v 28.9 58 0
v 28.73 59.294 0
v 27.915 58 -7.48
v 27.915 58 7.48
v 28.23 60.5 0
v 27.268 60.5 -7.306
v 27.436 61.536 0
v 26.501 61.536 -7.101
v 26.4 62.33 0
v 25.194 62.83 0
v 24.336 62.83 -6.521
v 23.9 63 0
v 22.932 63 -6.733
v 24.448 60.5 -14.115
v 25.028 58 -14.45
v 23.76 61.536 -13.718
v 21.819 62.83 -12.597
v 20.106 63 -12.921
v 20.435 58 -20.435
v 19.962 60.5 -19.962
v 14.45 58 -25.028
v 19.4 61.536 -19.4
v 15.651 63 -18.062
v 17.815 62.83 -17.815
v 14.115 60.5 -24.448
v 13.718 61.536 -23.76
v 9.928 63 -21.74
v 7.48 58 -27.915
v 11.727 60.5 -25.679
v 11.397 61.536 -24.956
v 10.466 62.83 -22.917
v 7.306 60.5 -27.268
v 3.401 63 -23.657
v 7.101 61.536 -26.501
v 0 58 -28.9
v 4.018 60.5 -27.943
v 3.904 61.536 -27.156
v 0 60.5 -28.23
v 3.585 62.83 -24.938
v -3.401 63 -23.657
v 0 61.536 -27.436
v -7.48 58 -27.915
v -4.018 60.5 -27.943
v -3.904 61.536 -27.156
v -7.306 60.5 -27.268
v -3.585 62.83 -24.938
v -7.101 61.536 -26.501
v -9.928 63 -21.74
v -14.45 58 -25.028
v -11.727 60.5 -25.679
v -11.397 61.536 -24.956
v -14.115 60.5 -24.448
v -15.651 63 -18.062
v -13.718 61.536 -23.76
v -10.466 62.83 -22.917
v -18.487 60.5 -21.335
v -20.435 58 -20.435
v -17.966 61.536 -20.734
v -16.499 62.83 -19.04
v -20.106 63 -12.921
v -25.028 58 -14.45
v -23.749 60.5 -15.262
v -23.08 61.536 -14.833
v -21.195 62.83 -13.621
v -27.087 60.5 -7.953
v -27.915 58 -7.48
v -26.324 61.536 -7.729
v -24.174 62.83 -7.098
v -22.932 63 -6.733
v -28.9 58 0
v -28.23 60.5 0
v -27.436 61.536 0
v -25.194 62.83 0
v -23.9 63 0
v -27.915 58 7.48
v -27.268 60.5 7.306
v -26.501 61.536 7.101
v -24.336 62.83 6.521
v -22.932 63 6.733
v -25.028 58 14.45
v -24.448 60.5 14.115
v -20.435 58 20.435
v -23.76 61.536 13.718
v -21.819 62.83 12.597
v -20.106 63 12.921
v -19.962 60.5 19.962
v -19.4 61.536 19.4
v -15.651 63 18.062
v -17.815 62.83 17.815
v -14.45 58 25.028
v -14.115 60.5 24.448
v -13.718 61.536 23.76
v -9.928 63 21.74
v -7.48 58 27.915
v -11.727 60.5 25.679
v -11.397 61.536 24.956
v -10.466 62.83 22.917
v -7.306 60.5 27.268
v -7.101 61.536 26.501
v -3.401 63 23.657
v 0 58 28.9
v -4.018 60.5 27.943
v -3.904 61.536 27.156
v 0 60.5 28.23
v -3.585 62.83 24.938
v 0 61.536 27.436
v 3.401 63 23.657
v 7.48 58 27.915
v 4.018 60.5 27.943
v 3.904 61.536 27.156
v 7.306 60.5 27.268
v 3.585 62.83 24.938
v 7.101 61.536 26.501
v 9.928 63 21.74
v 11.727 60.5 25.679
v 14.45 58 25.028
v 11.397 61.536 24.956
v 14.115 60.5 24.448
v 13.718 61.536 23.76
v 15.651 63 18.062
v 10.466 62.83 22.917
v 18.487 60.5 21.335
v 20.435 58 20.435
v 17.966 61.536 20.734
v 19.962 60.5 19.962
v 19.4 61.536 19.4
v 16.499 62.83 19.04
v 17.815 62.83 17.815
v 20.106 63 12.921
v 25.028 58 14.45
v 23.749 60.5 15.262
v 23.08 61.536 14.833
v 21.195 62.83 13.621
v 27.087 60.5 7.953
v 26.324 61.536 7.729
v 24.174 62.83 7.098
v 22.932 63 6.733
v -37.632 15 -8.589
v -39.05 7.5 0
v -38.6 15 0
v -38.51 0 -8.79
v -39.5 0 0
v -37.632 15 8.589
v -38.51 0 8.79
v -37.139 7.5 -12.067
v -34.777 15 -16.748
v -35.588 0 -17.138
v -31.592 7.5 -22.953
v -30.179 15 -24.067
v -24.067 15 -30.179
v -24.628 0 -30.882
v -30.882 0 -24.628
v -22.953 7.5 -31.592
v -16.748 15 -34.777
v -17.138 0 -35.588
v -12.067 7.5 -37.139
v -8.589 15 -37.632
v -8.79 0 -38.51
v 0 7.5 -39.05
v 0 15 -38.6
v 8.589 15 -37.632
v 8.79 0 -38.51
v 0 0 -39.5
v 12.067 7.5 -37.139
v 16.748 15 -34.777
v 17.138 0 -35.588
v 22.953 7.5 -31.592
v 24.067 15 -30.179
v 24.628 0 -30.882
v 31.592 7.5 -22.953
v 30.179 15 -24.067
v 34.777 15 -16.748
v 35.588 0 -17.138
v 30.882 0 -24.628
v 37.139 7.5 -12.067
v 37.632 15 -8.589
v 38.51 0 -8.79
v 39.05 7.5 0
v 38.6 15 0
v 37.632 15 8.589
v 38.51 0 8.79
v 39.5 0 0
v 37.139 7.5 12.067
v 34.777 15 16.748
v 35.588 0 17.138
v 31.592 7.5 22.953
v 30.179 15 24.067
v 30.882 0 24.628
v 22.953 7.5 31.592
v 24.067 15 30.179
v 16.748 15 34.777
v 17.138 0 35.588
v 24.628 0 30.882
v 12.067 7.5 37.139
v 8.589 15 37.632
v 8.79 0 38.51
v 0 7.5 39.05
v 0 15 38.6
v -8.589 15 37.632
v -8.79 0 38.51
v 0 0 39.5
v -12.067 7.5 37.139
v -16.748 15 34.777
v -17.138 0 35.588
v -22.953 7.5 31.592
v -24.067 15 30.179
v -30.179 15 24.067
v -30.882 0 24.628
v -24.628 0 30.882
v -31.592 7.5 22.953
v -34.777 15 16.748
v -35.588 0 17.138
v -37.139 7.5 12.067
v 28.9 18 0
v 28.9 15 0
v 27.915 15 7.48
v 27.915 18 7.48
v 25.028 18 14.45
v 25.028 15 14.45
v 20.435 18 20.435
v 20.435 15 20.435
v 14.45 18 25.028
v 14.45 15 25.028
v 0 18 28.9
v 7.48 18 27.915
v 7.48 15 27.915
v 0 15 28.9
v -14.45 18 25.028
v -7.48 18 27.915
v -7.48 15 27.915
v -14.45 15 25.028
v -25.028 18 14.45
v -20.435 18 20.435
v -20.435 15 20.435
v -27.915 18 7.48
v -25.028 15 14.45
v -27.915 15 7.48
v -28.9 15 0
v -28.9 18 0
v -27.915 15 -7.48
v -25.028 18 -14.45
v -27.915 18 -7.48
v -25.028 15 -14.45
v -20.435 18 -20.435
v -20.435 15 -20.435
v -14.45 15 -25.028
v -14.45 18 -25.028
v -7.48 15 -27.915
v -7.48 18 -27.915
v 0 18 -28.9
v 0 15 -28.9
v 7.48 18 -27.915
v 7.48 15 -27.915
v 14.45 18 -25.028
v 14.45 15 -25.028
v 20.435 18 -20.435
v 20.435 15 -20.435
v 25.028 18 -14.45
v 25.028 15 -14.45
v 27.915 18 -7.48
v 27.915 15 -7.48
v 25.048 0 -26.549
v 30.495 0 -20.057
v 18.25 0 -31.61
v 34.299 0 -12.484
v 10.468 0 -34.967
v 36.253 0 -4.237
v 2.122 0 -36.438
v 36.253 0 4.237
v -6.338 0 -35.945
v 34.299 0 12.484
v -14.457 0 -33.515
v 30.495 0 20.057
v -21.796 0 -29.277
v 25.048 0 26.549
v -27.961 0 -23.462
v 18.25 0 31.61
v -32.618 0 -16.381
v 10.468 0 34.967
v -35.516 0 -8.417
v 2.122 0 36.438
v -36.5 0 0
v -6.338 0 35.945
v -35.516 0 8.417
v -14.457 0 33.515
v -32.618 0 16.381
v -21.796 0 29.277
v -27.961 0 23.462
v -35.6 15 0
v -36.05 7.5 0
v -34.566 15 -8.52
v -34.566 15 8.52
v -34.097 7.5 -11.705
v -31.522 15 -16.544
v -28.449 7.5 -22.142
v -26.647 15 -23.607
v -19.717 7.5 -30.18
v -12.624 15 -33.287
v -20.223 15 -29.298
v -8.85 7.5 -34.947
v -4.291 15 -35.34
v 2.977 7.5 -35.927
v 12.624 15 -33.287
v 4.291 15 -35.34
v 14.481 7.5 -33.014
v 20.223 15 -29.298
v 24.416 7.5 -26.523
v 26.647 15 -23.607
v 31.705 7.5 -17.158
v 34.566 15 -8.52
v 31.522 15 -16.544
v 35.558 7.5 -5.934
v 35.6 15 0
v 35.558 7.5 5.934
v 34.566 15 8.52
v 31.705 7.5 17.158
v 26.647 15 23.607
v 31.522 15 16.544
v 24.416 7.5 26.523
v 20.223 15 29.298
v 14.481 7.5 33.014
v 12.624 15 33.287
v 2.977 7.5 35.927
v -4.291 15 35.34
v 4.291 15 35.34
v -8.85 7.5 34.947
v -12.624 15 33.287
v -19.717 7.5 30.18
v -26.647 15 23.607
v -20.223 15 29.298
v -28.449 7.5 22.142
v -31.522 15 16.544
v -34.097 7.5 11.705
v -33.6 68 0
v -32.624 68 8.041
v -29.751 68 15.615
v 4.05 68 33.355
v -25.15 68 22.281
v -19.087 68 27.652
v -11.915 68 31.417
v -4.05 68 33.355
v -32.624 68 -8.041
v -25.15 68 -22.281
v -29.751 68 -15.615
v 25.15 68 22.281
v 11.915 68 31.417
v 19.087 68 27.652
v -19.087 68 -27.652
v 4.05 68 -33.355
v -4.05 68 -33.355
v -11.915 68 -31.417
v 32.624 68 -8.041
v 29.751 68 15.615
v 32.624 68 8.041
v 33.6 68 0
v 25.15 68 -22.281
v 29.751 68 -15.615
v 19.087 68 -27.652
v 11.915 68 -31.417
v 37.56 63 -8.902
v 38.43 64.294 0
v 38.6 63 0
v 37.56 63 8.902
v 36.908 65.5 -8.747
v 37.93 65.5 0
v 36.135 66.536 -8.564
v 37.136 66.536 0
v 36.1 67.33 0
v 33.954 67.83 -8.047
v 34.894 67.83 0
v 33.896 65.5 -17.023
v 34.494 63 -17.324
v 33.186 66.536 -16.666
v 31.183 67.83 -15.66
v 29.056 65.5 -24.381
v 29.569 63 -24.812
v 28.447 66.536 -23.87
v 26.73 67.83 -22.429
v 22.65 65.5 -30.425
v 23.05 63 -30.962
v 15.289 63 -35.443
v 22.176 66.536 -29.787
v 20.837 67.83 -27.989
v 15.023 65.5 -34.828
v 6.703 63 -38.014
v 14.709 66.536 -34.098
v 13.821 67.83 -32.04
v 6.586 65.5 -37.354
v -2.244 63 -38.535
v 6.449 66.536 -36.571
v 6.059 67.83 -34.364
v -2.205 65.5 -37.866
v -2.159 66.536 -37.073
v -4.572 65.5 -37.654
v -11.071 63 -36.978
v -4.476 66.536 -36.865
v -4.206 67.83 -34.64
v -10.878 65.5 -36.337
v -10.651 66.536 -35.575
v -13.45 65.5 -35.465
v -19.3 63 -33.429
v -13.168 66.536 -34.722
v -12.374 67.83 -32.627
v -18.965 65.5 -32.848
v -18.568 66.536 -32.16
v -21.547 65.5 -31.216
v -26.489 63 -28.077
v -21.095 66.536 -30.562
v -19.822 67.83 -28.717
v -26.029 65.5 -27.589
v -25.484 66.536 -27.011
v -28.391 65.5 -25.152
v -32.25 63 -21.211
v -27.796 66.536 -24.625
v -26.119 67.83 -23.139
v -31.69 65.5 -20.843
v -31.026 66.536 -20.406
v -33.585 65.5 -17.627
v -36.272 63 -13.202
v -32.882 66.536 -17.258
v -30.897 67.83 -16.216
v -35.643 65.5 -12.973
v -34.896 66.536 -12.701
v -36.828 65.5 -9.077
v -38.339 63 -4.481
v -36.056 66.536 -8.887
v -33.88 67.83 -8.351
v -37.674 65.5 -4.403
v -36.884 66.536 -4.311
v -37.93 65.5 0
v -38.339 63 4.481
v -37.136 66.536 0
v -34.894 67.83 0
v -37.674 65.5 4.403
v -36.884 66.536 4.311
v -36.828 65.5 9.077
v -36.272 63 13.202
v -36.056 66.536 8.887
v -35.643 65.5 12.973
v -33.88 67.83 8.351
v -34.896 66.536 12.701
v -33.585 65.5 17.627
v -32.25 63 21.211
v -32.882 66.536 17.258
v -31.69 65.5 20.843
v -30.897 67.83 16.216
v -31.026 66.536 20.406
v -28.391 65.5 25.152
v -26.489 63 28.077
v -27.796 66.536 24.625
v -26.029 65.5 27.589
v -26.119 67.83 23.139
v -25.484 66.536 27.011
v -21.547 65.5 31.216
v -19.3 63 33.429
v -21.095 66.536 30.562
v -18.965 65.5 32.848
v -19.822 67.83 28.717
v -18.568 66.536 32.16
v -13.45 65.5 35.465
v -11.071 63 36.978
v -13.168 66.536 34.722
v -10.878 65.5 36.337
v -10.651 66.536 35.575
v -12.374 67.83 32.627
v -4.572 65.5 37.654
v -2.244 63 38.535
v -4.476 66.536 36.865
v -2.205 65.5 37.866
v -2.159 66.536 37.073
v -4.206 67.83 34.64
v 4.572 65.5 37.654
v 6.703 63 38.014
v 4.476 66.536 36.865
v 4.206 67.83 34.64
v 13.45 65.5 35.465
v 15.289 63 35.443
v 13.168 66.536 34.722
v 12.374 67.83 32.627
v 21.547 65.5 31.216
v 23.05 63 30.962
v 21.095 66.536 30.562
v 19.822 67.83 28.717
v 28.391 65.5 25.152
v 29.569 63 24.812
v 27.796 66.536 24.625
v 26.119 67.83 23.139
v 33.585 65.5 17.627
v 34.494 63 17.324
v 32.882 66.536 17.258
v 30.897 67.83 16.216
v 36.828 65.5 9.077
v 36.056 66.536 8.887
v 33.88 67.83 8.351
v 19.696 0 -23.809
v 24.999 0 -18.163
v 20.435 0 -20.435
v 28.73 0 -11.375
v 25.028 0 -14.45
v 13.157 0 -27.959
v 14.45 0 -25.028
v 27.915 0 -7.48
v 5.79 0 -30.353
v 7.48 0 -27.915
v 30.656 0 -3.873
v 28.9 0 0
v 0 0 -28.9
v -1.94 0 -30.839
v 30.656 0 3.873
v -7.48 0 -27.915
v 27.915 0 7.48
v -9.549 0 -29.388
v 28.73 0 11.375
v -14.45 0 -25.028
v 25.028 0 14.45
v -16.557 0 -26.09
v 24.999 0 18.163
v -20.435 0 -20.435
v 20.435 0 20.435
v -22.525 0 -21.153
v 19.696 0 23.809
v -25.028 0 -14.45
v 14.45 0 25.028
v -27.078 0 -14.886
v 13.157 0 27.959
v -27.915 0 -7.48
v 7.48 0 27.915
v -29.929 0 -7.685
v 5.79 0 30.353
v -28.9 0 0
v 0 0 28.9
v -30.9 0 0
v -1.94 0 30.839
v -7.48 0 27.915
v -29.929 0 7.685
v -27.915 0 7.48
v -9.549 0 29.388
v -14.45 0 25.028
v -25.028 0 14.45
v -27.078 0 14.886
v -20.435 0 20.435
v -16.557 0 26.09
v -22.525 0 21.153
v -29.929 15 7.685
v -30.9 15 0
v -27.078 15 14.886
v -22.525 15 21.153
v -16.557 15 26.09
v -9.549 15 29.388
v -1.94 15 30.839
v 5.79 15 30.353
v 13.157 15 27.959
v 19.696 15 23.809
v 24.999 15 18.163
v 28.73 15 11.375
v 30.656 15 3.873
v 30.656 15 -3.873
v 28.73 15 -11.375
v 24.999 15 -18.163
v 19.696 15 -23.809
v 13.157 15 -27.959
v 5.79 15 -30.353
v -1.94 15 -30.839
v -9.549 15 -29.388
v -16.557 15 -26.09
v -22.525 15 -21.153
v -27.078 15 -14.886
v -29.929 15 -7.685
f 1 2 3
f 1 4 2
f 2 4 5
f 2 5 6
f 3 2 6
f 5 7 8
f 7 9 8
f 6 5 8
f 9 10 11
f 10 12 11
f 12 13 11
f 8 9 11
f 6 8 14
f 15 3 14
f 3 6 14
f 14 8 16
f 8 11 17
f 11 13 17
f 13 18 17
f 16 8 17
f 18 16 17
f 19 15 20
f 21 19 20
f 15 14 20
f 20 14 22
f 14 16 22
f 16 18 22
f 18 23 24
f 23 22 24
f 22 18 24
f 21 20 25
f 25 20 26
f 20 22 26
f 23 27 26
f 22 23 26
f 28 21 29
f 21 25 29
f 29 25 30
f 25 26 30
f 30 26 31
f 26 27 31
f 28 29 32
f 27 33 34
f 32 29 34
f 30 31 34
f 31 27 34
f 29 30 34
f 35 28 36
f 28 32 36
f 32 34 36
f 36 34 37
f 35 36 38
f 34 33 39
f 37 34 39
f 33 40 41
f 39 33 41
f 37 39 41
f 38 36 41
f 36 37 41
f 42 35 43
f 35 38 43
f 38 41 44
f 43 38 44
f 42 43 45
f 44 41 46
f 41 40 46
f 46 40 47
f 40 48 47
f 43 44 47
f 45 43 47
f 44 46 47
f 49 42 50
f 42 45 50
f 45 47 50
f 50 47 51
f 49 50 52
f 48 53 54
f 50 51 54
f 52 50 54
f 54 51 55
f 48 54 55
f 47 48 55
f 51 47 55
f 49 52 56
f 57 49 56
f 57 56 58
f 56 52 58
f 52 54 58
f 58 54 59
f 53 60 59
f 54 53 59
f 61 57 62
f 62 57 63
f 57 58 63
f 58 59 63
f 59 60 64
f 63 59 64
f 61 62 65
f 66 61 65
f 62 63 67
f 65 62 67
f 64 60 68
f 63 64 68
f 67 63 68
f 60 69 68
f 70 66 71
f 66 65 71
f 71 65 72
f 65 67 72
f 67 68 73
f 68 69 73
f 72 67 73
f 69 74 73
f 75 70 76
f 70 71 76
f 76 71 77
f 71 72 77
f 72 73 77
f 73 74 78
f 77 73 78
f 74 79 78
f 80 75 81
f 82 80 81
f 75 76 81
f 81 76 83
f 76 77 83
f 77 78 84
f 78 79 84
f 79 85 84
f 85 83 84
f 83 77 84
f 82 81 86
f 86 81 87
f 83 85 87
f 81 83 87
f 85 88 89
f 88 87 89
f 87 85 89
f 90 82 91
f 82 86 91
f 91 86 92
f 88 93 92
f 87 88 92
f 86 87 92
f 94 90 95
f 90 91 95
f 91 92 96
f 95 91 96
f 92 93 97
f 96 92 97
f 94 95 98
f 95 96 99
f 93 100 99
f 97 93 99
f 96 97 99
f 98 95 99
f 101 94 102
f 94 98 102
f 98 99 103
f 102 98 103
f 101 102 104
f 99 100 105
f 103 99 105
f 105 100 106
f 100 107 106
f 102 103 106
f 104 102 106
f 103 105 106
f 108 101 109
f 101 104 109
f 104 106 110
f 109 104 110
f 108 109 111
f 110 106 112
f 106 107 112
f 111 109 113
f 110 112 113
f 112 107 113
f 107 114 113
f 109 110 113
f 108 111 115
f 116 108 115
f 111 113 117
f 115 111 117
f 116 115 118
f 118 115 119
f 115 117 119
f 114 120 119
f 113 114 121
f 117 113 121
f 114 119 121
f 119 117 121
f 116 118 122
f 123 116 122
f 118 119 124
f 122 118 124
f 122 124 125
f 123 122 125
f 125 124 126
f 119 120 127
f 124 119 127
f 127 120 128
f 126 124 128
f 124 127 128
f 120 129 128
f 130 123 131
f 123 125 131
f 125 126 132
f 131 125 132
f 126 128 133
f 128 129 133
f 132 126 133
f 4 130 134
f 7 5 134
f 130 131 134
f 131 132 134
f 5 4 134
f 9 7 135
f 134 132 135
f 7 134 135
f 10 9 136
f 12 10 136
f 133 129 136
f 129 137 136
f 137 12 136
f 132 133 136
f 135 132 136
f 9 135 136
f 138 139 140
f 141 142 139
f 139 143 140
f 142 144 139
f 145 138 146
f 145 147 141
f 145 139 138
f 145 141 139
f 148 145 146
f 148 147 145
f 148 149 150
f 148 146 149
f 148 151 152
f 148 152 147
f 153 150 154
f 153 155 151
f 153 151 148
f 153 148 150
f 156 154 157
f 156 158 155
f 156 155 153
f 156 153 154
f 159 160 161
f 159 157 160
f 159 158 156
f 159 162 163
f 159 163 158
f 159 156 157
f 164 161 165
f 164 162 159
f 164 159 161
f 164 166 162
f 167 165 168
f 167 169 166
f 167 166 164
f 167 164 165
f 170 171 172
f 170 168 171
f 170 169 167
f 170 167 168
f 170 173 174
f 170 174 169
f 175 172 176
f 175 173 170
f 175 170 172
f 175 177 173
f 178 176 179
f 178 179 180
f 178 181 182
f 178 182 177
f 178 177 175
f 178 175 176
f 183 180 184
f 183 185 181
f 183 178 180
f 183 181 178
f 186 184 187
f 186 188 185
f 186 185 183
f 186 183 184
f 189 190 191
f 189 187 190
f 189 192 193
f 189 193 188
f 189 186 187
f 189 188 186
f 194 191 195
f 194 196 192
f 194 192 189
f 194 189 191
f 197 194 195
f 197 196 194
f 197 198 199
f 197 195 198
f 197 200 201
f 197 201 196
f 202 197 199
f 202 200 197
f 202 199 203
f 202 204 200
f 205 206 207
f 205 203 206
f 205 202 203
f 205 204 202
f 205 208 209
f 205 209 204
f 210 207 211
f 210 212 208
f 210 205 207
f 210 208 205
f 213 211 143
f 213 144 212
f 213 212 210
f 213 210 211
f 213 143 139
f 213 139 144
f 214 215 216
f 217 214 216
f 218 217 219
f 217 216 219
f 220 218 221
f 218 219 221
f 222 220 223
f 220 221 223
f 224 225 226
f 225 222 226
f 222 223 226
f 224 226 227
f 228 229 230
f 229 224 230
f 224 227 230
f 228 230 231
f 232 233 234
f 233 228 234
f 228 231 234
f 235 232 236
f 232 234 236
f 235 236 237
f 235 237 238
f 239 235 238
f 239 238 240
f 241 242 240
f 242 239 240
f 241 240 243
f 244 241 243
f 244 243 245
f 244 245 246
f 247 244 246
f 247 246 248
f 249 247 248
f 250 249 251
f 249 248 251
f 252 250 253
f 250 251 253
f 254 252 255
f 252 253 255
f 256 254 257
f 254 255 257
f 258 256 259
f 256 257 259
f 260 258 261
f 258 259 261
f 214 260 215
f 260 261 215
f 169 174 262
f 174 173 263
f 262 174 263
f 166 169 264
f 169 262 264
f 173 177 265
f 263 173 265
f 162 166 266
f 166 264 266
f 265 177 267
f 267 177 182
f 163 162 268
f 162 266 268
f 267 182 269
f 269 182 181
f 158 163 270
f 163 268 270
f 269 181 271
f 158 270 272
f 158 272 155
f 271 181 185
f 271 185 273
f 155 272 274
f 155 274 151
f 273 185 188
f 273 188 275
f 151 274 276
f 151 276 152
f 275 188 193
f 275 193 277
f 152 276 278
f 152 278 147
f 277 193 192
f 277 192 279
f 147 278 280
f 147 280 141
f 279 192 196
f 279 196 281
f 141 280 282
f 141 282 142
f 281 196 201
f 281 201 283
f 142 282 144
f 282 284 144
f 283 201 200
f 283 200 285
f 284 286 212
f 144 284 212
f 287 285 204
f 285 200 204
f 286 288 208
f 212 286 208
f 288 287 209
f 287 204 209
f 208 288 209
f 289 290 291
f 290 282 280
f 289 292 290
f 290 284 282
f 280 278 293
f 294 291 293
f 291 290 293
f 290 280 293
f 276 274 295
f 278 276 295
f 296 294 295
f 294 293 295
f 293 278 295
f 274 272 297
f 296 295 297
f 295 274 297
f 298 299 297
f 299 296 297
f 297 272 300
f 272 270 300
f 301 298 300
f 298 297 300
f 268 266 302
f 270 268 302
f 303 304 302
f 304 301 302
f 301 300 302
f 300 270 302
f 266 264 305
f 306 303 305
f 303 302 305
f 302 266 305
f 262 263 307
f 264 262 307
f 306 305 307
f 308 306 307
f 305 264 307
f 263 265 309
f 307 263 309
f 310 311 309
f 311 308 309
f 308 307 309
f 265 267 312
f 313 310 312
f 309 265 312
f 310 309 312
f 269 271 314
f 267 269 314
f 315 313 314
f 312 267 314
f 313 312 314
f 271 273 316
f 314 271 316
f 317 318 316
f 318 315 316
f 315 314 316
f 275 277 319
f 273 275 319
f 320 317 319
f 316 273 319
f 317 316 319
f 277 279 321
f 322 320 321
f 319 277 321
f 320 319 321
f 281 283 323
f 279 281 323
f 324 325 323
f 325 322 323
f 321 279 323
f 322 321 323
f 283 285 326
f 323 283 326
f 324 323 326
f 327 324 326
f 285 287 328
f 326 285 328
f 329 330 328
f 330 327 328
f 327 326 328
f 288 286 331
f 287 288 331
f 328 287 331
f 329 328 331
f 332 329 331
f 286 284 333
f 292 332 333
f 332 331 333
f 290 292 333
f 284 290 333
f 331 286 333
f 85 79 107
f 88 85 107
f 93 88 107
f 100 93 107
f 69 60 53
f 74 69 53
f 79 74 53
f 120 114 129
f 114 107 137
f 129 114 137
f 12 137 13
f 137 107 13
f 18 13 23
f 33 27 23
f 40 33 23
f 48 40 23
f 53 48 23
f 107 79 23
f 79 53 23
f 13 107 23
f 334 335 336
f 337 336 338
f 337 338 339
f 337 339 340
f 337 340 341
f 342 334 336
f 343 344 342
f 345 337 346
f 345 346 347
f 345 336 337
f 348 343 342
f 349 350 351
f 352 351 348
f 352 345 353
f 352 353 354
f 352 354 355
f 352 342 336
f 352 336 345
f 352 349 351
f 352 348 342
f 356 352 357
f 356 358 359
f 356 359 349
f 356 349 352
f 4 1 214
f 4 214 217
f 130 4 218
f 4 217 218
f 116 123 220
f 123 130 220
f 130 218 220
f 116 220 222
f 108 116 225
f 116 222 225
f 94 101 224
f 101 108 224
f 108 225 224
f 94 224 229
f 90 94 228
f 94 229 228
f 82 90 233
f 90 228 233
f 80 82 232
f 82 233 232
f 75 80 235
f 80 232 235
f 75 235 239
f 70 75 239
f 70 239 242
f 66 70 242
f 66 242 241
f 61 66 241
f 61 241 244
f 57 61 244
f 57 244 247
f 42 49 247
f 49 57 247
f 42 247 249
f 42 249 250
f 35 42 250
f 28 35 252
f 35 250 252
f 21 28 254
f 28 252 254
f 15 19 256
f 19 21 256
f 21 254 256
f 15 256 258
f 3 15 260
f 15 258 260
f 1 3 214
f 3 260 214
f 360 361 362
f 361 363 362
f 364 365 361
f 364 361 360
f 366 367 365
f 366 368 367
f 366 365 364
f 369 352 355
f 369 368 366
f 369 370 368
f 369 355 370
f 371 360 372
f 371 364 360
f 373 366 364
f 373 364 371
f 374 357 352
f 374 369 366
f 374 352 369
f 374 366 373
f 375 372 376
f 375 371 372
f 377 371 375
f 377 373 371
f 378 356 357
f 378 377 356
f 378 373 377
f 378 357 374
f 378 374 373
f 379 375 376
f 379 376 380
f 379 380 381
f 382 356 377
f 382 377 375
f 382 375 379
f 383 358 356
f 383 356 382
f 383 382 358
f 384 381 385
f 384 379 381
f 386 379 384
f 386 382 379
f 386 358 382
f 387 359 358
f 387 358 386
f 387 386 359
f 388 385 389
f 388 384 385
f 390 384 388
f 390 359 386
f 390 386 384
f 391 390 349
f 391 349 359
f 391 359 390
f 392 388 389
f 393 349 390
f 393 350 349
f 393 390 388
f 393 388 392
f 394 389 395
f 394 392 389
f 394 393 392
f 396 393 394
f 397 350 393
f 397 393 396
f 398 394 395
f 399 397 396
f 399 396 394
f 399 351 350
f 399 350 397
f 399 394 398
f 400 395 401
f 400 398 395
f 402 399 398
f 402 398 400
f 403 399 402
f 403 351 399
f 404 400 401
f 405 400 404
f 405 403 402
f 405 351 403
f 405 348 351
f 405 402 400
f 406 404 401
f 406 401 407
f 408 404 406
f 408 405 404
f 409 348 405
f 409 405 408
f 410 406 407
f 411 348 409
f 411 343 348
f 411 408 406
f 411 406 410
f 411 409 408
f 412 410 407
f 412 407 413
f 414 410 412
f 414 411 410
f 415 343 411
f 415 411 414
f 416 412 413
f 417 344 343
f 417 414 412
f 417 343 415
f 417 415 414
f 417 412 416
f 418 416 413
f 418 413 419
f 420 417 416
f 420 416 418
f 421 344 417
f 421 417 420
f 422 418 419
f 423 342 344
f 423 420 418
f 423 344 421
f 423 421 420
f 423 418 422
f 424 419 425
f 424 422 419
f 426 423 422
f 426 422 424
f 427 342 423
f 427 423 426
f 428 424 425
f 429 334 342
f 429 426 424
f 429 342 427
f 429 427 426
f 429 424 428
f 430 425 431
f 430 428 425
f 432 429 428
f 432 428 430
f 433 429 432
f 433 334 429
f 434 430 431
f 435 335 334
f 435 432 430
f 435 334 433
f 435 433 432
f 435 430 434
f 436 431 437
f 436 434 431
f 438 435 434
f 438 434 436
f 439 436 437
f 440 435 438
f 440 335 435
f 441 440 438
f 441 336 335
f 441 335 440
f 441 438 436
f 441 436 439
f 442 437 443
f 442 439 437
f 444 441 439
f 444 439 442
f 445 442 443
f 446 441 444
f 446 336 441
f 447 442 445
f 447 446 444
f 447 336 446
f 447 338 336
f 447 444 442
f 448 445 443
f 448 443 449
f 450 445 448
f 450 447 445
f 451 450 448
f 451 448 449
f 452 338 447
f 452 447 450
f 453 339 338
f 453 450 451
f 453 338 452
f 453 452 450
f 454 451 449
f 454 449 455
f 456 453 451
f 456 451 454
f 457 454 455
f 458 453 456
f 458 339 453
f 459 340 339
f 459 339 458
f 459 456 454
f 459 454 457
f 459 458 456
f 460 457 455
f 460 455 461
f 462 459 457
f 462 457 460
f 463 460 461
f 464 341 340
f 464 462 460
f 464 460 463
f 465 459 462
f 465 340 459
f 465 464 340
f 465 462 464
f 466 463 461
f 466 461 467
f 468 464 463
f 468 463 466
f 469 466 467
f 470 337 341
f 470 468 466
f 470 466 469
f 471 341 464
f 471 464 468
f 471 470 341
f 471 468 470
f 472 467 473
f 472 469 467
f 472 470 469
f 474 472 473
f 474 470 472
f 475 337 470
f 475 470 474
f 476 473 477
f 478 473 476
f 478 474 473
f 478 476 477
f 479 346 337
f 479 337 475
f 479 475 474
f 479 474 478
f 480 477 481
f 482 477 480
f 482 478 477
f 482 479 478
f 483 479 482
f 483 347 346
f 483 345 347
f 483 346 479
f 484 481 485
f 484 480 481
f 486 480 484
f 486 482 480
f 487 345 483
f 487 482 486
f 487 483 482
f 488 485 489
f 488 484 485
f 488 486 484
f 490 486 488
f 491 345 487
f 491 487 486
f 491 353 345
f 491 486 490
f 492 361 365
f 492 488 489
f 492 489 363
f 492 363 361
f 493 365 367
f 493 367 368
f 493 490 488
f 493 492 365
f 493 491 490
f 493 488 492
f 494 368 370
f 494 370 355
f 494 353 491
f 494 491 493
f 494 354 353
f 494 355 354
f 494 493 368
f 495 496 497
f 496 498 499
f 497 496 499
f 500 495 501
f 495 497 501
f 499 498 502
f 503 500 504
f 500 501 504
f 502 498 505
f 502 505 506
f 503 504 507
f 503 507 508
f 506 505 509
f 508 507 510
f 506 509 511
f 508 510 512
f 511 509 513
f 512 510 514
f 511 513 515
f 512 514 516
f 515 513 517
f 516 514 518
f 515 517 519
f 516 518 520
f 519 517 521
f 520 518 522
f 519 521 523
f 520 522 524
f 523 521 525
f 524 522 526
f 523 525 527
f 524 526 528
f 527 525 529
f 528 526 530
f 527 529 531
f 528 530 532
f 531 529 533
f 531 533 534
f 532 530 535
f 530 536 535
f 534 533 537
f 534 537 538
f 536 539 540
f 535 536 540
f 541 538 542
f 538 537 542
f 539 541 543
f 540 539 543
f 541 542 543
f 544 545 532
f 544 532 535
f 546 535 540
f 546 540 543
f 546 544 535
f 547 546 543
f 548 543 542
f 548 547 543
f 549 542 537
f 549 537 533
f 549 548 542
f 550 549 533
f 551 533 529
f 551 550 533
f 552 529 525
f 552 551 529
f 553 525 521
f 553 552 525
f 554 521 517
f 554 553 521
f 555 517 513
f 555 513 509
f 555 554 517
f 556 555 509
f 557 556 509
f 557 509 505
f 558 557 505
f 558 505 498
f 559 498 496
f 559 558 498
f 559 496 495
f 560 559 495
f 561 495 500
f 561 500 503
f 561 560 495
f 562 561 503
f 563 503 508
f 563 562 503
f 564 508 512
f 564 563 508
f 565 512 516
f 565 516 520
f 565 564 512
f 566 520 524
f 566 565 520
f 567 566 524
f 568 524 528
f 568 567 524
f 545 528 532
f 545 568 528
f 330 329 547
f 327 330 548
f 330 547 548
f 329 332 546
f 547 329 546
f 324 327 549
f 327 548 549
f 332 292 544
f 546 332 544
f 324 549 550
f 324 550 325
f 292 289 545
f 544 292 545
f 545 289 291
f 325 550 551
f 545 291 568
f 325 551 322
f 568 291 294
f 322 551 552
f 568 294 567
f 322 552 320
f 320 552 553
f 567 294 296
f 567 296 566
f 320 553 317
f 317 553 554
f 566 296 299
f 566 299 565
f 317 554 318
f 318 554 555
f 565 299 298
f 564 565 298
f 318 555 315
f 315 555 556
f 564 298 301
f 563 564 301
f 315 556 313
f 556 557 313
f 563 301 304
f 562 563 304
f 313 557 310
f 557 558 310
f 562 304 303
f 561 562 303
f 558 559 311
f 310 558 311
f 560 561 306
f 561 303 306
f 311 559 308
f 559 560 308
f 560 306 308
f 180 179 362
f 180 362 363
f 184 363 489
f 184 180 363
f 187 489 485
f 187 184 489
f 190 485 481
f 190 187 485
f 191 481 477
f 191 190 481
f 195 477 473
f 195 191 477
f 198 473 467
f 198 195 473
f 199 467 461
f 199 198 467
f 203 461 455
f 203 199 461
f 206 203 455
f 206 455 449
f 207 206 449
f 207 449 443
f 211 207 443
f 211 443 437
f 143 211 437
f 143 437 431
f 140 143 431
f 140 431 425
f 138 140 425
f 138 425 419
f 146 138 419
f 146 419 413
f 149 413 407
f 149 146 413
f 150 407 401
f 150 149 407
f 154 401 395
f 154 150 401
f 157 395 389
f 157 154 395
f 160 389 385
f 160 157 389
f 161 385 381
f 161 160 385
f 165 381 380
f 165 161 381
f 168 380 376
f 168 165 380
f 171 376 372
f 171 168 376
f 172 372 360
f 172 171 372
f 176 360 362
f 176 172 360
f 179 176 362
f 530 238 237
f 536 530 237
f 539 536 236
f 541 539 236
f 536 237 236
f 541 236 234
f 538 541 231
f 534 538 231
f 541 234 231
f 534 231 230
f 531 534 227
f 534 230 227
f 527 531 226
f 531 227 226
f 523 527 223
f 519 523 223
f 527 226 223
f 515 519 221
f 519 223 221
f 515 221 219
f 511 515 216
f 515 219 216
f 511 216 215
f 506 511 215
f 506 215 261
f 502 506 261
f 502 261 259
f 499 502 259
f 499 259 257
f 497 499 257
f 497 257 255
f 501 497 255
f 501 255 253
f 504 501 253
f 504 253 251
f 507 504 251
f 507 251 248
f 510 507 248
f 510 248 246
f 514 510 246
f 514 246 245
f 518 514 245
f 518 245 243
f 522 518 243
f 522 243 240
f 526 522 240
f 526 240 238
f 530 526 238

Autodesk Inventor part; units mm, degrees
ref_plane "YZ Plane" through (0, 0, 0) normal (1, 0, 0) x (0, 1, 0)
sketch "Sketch1" plane through (0, 0, 0) normal (0, 1, 0) x (-1, 0, 0)
  circle A0 centre (0, 0) radius 35.1 construction
  circle A1 centre (0, 0) radius 31.4 construction
  circle A2 centre (0, 0) radius 36 construction
  circle A3 centre (0, 0) radius 27.65 construction
  circle A4 centre (0, 0) radius 32.3 construction
  circle A5 centre (0, 0) radius 31.8
  circle A6 centre (0, 0) radius 36.5
  circle A7 centre (0, 0) radius 29.8
  circle A8 centre (0, 0) radius 39.5
  dimension "d0" = 70.2
  dimension "d1" = 62.8
  dimension "d2" = 72
  dimension "d3" = 55.3
  dimension "d4" = 0.9
  dimension "d5" = 0.9
  dimension "d6" = 0.5
  dimension "d7" = 0.5
  dimension "d11" = 2
  dimension "d12" = 3
ref_plane "Work Plane1" through (0, 15, 0) normal (0, 1, 0) x (-1, 0, 0)
sketch "Sketch2" plane through (0, 15, 0) normal (0, 1, 0) x (-1, 0, 0)
  circle A0 centre (0, 0) radius 35.1 construction
  circle A1 centre (0, 0) radius 31.4 construction
  circle A2 centre (0, 0) radius 35.6
  circle A3 centre (0, 0) radius 30.9
  circle A4 centre (0, 0) radius 38.6
  circle A5 centre (0, 0) radius 28.9
  dimension "d9" = 0.5
  dimension "d10" = 0.5
  dimension "d13" = 3
  dimension "d14" = 2
loft "Loft1" add profiles "Sketch2", "Sketch1" contours A2 | A3 | A4 | A5 / A5 | A6 | A7 | A8
loft "Loft2" cut profiles "Sketch1", "Sketch2" contours A5 | A6 | A7 / A2 | A3 | A5
extrude "Extrusion1" add sketch "Sketch2" against normal up to surface (15 mm away) contours A3
sketch "Sketch3" plane through (0, 15, 0) normal (0, 1, 0) x (1, 0, 0)
  circle A0 centre (0, 0) radius 38.6 projected
  circle A1 centre (0, 0) radius 28.9 projected
  circle A2 centre (0, 0) radius 60.865
  dimension "d27" = 121.73
extrude "Extrusion2" add sketch "Sketch3" along normal blind 3 contours A0
ref_plane "Mating Plane with Cooling Shroud" through (0, 72.6, 0) normal (0, -1, 0) x (1, 0, 0)
ref_plane "Plane of the K flange face" through (0, 39, 0) normal (0, -1, 0) x (1, 0, 0)
sketch "Sketch4" plane through (0, 0, 0) normal (0, 1, 0) x (1, 0, 0)
  circle A0 centre (0, 0) radius 55 construction
  circle A1 centre (0, 55) radius 2.9
  circle A2 centre (0, 0) radius 39.5 construction
  circle A3 centre (0, 0) radius 60.865
  circle A4 centre (0, 0) radius 39.5 projected
  circle A5 centre (0, 0) radius 36.5 projected
  dimension "d30" = 110
  dimension "d31" = 5.8
  dimension "d32" = 121.73
extrude "Extrusion3" [suppressed]
extrude "Extrusion4" [suppressed]
pattern_circular "Circular Pattern1" [suppressed]
sketch "Sketch5" plane through (0, 18, 0) normal (0, 1, 0) x (1, 0, 0)
  circle A0 centre (0, 0) radius 28.9 projected
  circle A1 centre (0, 0) radius 31.9
  dimension "d40" = 3
extrude "Extrusion5" [suppressed]
sketch "Sketch7" plane through (0, 0, 0) normal (1, 0, 0) x (0, 1, 0)
  line L0 (0, -60.865) -> (3, -60.865) projected
  line L1 (3, -60.865) -> (3, 60.865) projected
  line L2 (0, -39.5) -> (15, -38.6) projected
  line L3 (15, -38.6) -> (18, -38.6) projected
  line L4 (18, -38.6) -> (18, 38.6) projected
  line L5 (18, -31.9) -> (72.6, -31.9) projected
  line L6 (3, -60.865) -> (72.6, -60.865)
  line L7 (72.6, -60.865) -> (72.6, -31.9)
  line L8 (-14.1, 0) -> (84.6, 0) projected
  point P0 (0, 0)
revolve "Revolution1" [suppressed]
pattern_circular "Circular Pattern2" [suppressed]
extrude "Extrusion6" [suppressed]
pattern_circular "Circular Pattern3" [suppressed]
sketch "Sketch8" plane through (0, 72.6, 0) normal (0, 1, 0) x (-1, 0, 0)
  circle A0 centre (0, 0) radius 39.85
  point P0 (0, 0)
  dimension "d52" = 79.7
extrude "Extrusion7" [suppressed]
sketch "Sketch9" plane through (0, 55.6, 0) normal (0, 1, 0) x (1, 0, 0)
  circle A0 centre (0, 0) radius 19.55
  arc A1 (-24.4368, -20.5049) -> (24.4368, -20.5049) centre (0, 0) ccw projected
  circle A2 centre (0, 0) radius 31.9
  point P0 (-24.4368, -20.5049)
  dimension "d57" = 39.1
extrude "Extrusion8" [suppressed]
sketch "Sketch10" plane through (0, 57.6, 0) normal (0, 1, 0) x (1, 0, 0)
  arc A0 (6, -25.55) -> (-6, -25.55) centre (0, -25.55) ccw
  line L0 (-6, -31.9) -> (6, -31.9) construction
  circle A1 centre (0, 0) radius 31.9 projected
  line L1 (-6, -31.9) -> (-6, -25.55)
  line L2 (6, -31.9) -> (6, -25.55)
  circle A2 centre (0, 0) radius 19.55 projected
  point P0 (0, -31.9)
  point P1 (-6, -31.3307)
  point P2 (6, -31.3307)
  dimension "d58" = 12
  dimension "d60" = 12
extrude "Extrusion9" [suppressed]
ref_plane "Work Plane4" through (0, 67.6, 31.9) normal (0, 0, 1) x (1, 0, 0)
sketch "Sketch11" plane through (0, 67.6, 31.9) normal (0, 0, 1) x (1, 0, 0)
  circle A0 centre (0, -5) radius 3.85
  line L0 (6, 0) -> (-6, 0) projected
  line L1 (-6, -10) -> (-6, 0) projected
  point P0 (0, -67.6)
  point P1 (0, 0)
  point P2 (-6, -5)
  dimension "d63" = 7.7
extrude "Extrusion10" [suppressed]
sketch "Sketch12" plane through (0, 67.6, 0) normal (0, 1, 0) x (1, 0, 0)
  point P0 (0, 0)
sketch "Sketch13" plane through (0, 62.6, 22.9) normal (0, 0, 1) x (1, 0, 0)
  circle A0 centre (0, 0) radius 0.75
  point P0 (0, -62.6)
  dimension "d66" = 1.5
extrude "Extrusion11" [suppressed]
sketch "Sketch15" plane through (0, 55.6, 0) normal (0, -1, 0) x (1, 0, 0)
  line L0 (-3.85, 22.9) -> (3.85, 22.9) projected
  circle A0 centre (0, 22.9) radius 1.5
  point P0 (0, 0)
  point P1 (-0.75, 22.9)
  point P2 (0.75, 22.9)
  dimension "d71" = 3
ref_plane "Work Plane5" through (0, 66.45, 31.9) normal (0, 1, 0) x (-1, 0, 0)
extrude "Extrusion12" [suppressed]
sketch "Sketch16" plane through (0, 57.6, 0) normal (0, 1, 0) x (1, 0, 0)
  line L0 (-19.55, 0) -> (-19.55, -35)
  line L1 (-19.55, -35) -> (19.55, -35)
  line L2 (19.55, -35) -> (19.55, 0)
  circle A0 centre (0, 0) radius 19.55 projected
  line L3 (-19.05, 0) -> (-19.05, -35)
  line L4 (19.05, 0) -> (19.05, -35)
  line L5 (-19.55, 0) -> (19.55, 0)
  point P0 (19.55, 0)
  point P1 (-19.05, -4.3932)
  point P2 (19.05, -4.3932)
  dimension "d74" = 0.5
  dimension "d75" = 0.5
  dimension "d76" = 35
extrude "Extrusion13" [suppressed]
ref_plane "Inside Plane of Lid Top" through (0, 63, 0) normal (0, -1, 0) x (1, 0, 0)
ref_plane "Top of the Dewar Neck" through (0, 38, 0) normal (0, -1, 0) x (1, 0, 0)
sketch "Sketch18" plane through (0, 18, 0) normal (0, 1, 0) x (1, 0, 0)
  circle A0 centre (0, 0) radius 38.6 projected
  circle A1 centre (0, 0) radius 28.9 projected
extrude "Extrusion14" add sketch "Sketch18" along normal up to surface (45 mm away)
sketch "Sketch19" plane through (0, 63, 0) normal (0, 1, 0) x (1, 0, 0)
  circle A0 centre (0, 0) radius 38.6 projected
extrude "Extrusion15" add sketch "Sketch19" along normal blind 5
fillet "Fillet1" radius 5 1 edges at (-38.6, 68, 0)
fillet "Fillet2" radius 5 1 edges at (-28.9, 63, 0)
properties part number "Pope8697-Adapter_3DPrint"
